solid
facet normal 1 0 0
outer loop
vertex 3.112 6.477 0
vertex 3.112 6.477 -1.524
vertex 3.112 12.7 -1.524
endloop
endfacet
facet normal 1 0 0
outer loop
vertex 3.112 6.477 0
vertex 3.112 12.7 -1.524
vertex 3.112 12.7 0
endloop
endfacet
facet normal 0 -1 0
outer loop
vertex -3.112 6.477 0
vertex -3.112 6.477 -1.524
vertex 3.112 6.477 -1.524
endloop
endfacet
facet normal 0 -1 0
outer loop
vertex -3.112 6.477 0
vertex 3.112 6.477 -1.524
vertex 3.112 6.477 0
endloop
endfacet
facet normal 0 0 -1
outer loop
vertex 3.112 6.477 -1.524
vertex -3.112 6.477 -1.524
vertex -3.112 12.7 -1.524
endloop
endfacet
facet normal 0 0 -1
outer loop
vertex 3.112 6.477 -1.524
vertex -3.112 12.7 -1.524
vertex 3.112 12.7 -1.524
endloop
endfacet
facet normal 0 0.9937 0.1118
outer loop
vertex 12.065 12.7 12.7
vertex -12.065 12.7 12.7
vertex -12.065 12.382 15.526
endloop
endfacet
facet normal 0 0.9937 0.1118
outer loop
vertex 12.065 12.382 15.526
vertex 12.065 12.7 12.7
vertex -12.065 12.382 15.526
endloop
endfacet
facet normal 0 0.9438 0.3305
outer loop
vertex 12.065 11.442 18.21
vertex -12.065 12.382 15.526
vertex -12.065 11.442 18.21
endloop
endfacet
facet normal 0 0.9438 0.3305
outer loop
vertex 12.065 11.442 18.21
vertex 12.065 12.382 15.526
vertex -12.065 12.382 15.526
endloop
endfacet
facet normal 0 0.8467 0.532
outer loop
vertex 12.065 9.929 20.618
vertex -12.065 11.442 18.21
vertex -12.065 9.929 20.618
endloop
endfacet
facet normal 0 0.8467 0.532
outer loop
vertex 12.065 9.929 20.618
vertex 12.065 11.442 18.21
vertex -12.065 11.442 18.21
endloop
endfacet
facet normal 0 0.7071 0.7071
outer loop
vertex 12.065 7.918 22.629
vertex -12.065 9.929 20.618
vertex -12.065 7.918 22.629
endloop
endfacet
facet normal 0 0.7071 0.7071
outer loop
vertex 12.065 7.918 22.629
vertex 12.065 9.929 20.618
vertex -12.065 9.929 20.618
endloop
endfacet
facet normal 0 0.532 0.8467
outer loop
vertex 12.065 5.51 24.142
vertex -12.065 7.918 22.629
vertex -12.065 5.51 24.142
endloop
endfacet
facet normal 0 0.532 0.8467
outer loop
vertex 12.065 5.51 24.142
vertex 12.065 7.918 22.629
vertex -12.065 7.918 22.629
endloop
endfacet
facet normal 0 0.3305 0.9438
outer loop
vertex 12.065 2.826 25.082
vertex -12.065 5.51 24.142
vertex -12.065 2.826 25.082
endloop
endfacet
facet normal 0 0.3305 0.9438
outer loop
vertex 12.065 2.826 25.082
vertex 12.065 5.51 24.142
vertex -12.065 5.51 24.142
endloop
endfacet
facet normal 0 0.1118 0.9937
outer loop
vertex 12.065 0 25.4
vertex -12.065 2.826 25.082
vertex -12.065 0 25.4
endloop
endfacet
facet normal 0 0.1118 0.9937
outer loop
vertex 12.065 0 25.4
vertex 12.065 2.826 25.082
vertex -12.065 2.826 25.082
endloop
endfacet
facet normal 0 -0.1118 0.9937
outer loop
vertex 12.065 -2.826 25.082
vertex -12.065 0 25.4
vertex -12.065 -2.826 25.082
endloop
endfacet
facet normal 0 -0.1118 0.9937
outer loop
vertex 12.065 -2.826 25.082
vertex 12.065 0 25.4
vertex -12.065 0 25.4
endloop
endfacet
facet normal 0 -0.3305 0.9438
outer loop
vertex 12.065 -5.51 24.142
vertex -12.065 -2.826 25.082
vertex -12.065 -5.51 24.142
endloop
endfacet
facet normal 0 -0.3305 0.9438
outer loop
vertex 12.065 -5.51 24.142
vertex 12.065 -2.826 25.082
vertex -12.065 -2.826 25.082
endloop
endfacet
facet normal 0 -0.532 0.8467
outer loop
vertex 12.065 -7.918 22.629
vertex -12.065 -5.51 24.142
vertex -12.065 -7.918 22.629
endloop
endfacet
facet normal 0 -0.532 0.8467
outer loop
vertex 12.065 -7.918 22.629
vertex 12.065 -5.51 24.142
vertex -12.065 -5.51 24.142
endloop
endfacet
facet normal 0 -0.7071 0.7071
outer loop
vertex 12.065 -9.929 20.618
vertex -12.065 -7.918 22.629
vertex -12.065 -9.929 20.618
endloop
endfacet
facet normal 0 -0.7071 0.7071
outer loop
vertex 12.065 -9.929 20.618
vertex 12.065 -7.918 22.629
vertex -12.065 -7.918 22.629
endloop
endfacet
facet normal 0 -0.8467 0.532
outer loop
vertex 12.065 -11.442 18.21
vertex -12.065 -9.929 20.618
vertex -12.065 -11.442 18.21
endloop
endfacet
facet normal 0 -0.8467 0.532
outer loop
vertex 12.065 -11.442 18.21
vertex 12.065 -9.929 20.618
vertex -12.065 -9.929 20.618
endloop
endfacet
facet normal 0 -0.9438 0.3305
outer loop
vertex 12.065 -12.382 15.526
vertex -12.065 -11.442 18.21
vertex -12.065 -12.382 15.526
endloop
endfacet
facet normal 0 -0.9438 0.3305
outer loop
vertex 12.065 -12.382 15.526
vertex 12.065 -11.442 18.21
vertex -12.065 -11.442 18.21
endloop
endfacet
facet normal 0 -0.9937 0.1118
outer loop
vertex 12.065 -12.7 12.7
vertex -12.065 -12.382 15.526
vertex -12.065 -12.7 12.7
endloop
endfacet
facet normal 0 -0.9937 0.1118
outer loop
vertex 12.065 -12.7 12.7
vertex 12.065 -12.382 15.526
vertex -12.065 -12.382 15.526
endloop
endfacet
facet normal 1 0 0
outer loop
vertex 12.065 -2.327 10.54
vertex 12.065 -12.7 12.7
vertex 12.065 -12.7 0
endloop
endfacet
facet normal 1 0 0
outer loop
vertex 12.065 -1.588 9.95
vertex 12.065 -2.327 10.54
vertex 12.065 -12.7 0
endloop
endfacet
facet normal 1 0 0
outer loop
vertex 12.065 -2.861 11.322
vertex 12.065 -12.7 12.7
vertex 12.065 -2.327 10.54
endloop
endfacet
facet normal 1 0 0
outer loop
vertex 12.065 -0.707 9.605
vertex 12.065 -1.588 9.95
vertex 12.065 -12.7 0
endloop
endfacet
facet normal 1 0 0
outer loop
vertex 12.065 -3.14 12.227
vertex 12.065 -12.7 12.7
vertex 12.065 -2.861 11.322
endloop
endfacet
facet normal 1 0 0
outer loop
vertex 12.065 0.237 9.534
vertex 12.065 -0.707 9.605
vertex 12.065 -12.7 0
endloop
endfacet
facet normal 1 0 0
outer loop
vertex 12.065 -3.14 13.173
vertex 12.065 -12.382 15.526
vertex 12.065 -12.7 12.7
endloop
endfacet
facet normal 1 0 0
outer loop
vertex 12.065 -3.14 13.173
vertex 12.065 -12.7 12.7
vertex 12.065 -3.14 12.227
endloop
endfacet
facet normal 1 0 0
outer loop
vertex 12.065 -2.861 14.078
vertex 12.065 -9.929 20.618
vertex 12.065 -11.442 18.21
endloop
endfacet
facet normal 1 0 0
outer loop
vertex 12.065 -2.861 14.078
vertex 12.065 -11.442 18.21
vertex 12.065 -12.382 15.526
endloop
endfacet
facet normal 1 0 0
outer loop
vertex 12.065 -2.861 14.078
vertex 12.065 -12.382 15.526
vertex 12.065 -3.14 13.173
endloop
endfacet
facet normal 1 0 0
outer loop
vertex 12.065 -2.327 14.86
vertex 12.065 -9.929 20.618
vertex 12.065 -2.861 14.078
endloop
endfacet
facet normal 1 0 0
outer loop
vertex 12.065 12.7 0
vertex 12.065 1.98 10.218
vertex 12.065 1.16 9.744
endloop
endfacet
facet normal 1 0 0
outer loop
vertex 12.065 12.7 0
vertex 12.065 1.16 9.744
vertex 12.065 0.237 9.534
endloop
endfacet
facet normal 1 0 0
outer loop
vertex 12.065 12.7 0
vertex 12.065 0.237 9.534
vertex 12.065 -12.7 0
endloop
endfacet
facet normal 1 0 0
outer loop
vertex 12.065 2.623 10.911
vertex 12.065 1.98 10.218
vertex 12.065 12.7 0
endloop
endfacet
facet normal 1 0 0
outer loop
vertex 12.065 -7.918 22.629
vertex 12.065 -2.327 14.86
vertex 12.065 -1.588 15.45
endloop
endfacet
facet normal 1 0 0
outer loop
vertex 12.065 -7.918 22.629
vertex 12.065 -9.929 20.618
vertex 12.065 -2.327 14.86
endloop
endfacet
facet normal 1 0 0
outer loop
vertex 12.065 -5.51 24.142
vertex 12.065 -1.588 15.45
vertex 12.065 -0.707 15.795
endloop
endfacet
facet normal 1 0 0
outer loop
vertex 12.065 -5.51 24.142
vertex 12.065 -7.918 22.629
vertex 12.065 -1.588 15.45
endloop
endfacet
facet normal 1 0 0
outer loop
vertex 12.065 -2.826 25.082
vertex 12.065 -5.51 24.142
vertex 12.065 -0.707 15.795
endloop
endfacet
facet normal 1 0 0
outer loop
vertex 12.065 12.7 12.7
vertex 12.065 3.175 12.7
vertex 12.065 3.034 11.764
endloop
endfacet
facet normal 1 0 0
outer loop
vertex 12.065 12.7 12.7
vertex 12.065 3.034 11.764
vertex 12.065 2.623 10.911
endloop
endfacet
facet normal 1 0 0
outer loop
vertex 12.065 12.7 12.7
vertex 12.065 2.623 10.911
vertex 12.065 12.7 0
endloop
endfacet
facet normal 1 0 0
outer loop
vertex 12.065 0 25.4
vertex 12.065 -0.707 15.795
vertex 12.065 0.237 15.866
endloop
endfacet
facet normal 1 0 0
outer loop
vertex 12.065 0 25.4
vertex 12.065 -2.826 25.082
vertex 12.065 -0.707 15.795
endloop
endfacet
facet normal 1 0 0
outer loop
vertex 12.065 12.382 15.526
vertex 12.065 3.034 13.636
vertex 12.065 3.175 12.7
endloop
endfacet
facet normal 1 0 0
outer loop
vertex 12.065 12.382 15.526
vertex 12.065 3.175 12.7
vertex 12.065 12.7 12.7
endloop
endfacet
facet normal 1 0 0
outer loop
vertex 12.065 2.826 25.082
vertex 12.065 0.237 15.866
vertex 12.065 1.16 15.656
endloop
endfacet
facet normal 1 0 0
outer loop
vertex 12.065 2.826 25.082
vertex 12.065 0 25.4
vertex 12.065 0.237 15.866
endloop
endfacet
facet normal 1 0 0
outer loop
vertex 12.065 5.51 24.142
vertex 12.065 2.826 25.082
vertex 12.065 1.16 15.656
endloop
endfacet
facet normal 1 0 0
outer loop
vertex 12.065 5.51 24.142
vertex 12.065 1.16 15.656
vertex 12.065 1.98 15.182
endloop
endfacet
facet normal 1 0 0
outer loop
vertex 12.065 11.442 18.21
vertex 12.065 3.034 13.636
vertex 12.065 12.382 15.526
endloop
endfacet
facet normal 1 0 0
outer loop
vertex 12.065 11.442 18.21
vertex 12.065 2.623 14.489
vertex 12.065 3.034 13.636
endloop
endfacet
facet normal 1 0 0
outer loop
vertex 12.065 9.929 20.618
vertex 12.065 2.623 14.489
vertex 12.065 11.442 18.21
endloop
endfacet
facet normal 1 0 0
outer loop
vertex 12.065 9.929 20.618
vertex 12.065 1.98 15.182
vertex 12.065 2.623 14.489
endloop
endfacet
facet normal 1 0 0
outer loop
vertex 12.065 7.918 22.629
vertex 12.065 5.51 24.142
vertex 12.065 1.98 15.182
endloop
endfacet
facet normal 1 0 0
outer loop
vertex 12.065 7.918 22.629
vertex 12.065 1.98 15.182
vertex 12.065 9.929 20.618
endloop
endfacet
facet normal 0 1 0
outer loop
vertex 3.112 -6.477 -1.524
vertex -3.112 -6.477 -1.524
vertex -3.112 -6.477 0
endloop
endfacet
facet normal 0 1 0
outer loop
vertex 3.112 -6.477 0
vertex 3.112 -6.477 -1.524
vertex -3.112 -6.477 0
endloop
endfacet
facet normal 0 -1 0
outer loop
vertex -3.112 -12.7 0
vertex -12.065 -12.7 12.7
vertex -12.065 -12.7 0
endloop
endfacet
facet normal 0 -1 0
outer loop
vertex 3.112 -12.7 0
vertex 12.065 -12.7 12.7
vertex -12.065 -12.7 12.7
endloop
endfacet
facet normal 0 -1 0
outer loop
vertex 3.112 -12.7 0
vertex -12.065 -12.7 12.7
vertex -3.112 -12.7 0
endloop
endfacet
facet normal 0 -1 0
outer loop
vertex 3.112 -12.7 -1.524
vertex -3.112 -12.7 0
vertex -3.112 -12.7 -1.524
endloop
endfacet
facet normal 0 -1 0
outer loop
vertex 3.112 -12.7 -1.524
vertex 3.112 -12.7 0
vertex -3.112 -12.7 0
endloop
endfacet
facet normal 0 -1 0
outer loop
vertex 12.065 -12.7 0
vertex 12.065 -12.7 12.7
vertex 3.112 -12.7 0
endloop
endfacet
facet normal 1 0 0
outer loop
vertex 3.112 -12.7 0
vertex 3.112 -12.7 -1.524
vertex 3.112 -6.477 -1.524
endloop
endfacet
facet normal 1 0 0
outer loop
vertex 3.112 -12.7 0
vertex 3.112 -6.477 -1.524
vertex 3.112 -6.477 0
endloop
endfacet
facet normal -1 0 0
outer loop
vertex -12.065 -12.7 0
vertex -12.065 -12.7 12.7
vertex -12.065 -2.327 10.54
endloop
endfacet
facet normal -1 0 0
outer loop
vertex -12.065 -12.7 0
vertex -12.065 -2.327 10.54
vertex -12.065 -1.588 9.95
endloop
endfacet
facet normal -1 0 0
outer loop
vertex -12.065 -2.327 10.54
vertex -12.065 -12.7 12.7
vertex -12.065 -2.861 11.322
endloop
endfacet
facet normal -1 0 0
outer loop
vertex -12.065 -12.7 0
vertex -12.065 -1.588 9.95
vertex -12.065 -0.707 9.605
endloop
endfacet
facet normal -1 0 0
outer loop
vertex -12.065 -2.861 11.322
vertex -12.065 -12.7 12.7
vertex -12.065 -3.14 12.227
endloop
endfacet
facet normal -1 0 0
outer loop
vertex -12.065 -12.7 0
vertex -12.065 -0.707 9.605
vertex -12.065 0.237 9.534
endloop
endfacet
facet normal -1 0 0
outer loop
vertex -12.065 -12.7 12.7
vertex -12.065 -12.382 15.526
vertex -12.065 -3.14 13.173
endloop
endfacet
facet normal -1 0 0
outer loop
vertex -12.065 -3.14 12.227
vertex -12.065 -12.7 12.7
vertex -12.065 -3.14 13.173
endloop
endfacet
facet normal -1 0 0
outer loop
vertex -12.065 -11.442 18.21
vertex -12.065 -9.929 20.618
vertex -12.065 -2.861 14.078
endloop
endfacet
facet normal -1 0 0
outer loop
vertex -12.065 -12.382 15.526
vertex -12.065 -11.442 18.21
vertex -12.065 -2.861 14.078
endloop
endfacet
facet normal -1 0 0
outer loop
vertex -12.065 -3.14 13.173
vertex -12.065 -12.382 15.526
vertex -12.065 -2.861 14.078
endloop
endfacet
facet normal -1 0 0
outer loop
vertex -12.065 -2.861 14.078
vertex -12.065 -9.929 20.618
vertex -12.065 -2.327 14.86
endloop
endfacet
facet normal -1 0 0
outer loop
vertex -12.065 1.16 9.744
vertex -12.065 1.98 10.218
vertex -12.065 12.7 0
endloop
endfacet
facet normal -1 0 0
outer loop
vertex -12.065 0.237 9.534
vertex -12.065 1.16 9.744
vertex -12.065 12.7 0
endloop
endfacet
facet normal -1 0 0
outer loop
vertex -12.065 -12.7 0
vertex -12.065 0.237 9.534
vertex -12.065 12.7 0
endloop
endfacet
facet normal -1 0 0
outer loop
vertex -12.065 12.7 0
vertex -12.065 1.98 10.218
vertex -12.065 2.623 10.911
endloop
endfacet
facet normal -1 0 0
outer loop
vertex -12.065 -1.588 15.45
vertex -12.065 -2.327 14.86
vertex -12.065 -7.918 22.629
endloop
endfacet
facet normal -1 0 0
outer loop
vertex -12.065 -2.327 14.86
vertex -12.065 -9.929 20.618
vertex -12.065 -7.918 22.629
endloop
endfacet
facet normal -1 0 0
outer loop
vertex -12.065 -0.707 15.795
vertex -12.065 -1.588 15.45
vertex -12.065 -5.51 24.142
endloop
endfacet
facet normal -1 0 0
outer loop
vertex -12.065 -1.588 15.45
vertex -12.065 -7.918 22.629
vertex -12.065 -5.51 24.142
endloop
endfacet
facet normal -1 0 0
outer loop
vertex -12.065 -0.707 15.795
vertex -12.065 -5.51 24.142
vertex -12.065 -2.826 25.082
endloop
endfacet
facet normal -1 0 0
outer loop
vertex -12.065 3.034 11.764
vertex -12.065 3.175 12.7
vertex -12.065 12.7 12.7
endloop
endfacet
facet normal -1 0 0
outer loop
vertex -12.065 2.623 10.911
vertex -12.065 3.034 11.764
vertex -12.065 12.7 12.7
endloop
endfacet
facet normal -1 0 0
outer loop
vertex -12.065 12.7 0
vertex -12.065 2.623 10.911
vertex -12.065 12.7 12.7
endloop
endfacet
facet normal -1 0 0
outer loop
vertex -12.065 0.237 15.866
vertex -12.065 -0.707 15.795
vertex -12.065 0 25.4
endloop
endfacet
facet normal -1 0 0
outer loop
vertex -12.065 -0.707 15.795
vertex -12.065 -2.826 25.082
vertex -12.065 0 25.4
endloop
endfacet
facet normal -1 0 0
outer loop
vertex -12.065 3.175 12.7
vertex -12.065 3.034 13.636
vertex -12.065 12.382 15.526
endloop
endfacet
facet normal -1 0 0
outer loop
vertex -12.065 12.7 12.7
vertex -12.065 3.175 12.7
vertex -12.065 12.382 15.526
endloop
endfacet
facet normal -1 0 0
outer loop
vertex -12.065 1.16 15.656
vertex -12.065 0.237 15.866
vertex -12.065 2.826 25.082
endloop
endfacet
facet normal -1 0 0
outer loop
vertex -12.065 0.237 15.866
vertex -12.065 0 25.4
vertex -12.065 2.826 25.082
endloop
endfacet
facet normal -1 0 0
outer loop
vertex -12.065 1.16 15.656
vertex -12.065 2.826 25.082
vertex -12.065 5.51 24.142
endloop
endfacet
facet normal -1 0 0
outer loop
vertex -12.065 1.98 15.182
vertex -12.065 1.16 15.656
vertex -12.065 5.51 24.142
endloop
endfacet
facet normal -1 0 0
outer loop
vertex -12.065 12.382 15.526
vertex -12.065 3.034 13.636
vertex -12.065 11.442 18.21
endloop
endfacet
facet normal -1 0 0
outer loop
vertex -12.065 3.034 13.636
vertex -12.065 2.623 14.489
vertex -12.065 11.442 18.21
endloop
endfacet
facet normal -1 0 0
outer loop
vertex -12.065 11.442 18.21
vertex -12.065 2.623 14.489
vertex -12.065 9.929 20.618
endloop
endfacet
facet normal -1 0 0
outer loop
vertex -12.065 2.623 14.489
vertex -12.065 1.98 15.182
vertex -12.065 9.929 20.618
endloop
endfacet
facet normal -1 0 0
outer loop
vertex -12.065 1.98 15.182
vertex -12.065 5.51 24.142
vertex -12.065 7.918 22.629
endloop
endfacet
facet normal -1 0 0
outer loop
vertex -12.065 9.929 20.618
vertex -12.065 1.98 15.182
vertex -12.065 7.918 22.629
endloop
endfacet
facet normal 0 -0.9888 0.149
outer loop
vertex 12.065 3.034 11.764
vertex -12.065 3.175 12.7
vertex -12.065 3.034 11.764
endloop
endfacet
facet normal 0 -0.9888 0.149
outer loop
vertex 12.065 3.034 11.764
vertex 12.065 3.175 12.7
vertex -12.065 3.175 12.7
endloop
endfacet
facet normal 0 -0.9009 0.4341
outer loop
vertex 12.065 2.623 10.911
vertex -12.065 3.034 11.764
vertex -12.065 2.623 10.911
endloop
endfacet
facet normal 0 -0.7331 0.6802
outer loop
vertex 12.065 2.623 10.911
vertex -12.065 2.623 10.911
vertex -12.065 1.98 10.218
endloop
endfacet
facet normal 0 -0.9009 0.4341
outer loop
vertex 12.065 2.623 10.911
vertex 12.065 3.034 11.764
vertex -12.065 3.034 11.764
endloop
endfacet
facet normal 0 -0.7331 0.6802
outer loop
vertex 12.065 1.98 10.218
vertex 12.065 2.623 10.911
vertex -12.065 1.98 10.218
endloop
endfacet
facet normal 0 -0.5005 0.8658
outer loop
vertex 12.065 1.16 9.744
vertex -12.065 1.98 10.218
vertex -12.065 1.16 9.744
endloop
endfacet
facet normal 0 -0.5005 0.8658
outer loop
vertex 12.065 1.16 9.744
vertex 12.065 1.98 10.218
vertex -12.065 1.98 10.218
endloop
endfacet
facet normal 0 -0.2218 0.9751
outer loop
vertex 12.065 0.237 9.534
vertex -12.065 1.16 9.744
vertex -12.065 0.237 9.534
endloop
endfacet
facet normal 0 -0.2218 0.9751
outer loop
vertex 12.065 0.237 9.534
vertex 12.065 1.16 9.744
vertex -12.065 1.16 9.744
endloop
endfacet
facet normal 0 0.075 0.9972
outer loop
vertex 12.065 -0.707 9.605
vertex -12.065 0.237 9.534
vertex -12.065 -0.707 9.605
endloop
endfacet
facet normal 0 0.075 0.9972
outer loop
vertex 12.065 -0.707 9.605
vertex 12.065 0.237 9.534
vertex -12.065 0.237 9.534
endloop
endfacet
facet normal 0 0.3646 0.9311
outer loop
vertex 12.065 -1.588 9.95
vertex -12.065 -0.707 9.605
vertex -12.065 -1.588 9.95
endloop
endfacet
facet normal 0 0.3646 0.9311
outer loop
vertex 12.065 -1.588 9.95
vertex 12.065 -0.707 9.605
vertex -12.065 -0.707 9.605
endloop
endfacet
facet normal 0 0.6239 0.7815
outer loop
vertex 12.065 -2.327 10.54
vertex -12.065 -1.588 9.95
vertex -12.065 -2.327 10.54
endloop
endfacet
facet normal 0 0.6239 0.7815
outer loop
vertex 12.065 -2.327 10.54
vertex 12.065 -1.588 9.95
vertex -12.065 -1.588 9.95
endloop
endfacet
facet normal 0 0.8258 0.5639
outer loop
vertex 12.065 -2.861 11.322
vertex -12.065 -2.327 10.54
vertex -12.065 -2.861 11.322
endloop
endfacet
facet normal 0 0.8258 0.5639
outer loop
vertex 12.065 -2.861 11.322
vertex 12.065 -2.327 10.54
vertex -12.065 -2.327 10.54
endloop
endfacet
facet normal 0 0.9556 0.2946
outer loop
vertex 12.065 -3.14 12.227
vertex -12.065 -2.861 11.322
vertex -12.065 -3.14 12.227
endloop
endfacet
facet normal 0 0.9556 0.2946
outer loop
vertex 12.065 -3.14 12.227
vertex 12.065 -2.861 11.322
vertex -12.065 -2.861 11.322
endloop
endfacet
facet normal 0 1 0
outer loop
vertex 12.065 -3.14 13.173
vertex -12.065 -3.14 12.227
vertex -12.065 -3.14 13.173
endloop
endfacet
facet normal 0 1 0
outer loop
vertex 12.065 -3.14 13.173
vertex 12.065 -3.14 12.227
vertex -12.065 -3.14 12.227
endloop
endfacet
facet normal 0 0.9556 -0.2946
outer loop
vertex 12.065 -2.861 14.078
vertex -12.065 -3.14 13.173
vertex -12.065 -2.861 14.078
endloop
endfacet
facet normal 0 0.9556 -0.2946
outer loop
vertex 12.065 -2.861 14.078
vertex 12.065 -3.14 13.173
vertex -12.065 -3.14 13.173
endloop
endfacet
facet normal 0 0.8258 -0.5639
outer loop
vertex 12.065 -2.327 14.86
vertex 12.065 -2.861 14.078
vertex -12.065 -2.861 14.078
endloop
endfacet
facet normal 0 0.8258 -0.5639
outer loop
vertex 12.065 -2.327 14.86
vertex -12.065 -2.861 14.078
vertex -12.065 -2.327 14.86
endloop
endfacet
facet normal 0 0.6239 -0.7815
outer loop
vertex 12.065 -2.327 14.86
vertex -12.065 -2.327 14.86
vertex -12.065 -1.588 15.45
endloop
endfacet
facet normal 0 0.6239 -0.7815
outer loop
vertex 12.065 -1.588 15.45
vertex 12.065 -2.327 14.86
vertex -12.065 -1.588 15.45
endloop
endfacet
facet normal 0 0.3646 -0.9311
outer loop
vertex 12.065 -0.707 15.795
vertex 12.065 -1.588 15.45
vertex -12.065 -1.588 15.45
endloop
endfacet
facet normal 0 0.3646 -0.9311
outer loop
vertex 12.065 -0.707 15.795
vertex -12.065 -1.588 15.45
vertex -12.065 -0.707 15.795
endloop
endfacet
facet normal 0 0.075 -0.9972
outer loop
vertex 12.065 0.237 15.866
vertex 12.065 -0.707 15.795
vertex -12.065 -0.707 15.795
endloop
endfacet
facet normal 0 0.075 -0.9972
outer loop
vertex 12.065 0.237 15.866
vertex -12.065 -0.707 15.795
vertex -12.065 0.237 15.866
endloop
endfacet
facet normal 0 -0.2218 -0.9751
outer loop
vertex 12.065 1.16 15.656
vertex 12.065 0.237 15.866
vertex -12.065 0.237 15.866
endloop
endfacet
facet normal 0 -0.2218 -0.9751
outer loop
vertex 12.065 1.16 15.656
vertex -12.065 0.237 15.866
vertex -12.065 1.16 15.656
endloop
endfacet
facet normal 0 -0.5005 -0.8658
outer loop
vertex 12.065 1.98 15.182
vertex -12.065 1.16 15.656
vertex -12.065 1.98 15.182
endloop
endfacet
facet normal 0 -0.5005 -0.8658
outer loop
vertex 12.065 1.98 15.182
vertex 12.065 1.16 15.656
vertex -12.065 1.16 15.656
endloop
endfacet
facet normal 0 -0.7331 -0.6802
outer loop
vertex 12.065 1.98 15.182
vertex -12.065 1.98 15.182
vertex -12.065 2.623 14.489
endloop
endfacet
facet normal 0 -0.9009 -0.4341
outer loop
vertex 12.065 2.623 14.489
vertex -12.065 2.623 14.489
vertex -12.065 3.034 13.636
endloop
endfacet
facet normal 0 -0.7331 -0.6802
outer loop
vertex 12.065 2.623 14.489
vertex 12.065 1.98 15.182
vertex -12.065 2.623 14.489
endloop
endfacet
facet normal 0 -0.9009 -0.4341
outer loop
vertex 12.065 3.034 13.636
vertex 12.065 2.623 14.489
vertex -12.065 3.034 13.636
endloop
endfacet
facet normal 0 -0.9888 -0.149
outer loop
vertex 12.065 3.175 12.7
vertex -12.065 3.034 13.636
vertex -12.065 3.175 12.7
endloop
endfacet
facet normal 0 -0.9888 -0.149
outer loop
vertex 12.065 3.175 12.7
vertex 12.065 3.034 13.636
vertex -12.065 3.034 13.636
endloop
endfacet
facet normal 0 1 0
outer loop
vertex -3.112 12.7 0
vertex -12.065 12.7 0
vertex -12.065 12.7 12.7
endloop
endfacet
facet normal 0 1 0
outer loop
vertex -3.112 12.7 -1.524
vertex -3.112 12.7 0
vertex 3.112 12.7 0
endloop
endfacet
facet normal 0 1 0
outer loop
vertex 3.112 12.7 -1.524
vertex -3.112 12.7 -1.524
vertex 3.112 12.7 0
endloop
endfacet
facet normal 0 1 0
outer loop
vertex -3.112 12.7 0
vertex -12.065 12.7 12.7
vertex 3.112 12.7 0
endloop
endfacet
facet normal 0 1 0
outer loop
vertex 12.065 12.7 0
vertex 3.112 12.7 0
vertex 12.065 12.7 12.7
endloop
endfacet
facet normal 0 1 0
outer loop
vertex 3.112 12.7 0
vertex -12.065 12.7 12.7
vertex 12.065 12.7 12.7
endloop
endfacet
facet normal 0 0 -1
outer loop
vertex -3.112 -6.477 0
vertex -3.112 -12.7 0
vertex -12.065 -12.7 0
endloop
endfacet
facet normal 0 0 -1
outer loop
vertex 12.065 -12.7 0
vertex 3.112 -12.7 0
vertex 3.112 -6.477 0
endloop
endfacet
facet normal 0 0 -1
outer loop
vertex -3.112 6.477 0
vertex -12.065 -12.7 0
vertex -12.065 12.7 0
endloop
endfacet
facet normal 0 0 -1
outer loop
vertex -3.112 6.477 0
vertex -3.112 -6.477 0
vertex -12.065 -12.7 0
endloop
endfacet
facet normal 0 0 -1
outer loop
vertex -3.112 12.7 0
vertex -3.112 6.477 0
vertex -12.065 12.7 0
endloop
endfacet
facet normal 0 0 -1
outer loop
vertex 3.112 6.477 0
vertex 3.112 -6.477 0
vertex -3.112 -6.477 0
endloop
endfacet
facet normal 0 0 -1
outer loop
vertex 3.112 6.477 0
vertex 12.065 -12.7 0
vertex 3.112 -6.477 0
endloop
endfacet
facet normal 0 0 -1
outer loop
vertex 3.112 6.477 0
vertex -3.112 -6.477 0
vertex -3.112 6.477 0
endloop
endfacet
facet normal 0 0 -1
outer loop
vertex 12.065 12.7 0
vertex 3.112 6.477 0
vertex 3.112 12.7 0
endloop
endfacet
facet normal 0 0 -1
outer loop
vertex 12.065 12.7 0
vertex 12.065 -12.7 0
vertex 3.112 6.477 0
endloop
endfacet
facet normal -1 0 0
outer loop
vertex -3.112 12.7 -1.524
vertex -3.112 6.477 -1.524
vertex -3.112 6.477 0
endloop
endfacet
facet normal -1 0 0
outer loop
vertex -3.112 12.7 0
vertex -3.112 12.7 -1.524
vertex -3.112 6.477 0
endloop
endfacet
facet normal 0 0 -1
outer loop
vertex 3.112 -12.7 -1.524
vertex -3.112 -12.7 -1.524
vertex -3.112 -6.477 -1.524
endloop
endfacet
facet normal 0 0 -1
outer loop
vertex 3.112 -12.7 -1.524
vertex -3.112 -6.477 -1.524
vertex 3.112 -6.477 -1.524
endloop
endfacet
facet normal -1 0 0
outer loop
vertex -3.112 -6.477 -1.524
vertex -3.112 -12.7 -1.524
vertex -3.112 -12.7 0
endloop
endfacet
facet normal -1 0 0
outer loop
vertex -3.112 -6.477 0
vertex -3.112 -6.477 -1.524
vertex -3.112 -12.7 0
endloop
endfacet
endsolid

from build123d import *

# Parameters (mm, degrees)
F1_DEPTH      = 12.065
F2_W          = 6.223
F2_H          = 1.524
F3_DEPTH      = 12.7
F3_DEPTH_BACK = 12.7
F4_W          = 12.954
F4_H          = 1.524
F5_DEPTH      = 6.223


with BuildPart() as f1:
    # F0 (on Right) → F1 (new body, symmetric)
    with BuildSketch(Plane.YZ):
        with BuildLine():
            ThreePointArc((-3.175, 12.7), (0, 15.875), (3.175, 12.7))
            Line((3.175, 12.7), (12.7, 12.7))
            ThreePointArc((12.7, 12.7), (0, 25.4), (-12.7, 12.7))
            Line((-12.7, 12.7), (-3.175, 12.7))
        make_face()
        with BuildLine():
            Line((12.7, 12.7), (3.175, 12.7))
            ThreePointArc((3.175, 12.7), (0, 9.525), (-3.175, 12.7))
            Line((-3.175, 12.7), (-12.7, 12.7))
            Line((-12.7, 12.7), (-12.7, 0))
            Line((-12.7, 0), (12.7, 0))
            Line((12.7, 0), (12.7, 12.7))
        make_face()
    extrude(amount=F1_DEPTH, both=True)

    # F2 (on Front) → F3 (join, two sides)
    with BuildSketch(Plane.XZ) as f3_sk:
        with Locations((0, -0.762)):
            Rectangle(F2_W, F2_H)
    extrude(amount=F3_DEPTH)
    extrude(f3_sk.sketch, amount=-F3_DEPTH_BACK)

    # F4 (on face) → F5 (cut, through all)
    with BuildSketch(Plane(origin=(-3.1115, 0, 0), x_dir=(0, -1, 0), z_dir=(-1, 0, 0))):
        with Locations((0, -0.762)):
            Rectangle(F4_W, F4_H)
    extrude(amount=-F5_DEPTH, mode=Mode.SUBTRACT)


solid = f1.part
